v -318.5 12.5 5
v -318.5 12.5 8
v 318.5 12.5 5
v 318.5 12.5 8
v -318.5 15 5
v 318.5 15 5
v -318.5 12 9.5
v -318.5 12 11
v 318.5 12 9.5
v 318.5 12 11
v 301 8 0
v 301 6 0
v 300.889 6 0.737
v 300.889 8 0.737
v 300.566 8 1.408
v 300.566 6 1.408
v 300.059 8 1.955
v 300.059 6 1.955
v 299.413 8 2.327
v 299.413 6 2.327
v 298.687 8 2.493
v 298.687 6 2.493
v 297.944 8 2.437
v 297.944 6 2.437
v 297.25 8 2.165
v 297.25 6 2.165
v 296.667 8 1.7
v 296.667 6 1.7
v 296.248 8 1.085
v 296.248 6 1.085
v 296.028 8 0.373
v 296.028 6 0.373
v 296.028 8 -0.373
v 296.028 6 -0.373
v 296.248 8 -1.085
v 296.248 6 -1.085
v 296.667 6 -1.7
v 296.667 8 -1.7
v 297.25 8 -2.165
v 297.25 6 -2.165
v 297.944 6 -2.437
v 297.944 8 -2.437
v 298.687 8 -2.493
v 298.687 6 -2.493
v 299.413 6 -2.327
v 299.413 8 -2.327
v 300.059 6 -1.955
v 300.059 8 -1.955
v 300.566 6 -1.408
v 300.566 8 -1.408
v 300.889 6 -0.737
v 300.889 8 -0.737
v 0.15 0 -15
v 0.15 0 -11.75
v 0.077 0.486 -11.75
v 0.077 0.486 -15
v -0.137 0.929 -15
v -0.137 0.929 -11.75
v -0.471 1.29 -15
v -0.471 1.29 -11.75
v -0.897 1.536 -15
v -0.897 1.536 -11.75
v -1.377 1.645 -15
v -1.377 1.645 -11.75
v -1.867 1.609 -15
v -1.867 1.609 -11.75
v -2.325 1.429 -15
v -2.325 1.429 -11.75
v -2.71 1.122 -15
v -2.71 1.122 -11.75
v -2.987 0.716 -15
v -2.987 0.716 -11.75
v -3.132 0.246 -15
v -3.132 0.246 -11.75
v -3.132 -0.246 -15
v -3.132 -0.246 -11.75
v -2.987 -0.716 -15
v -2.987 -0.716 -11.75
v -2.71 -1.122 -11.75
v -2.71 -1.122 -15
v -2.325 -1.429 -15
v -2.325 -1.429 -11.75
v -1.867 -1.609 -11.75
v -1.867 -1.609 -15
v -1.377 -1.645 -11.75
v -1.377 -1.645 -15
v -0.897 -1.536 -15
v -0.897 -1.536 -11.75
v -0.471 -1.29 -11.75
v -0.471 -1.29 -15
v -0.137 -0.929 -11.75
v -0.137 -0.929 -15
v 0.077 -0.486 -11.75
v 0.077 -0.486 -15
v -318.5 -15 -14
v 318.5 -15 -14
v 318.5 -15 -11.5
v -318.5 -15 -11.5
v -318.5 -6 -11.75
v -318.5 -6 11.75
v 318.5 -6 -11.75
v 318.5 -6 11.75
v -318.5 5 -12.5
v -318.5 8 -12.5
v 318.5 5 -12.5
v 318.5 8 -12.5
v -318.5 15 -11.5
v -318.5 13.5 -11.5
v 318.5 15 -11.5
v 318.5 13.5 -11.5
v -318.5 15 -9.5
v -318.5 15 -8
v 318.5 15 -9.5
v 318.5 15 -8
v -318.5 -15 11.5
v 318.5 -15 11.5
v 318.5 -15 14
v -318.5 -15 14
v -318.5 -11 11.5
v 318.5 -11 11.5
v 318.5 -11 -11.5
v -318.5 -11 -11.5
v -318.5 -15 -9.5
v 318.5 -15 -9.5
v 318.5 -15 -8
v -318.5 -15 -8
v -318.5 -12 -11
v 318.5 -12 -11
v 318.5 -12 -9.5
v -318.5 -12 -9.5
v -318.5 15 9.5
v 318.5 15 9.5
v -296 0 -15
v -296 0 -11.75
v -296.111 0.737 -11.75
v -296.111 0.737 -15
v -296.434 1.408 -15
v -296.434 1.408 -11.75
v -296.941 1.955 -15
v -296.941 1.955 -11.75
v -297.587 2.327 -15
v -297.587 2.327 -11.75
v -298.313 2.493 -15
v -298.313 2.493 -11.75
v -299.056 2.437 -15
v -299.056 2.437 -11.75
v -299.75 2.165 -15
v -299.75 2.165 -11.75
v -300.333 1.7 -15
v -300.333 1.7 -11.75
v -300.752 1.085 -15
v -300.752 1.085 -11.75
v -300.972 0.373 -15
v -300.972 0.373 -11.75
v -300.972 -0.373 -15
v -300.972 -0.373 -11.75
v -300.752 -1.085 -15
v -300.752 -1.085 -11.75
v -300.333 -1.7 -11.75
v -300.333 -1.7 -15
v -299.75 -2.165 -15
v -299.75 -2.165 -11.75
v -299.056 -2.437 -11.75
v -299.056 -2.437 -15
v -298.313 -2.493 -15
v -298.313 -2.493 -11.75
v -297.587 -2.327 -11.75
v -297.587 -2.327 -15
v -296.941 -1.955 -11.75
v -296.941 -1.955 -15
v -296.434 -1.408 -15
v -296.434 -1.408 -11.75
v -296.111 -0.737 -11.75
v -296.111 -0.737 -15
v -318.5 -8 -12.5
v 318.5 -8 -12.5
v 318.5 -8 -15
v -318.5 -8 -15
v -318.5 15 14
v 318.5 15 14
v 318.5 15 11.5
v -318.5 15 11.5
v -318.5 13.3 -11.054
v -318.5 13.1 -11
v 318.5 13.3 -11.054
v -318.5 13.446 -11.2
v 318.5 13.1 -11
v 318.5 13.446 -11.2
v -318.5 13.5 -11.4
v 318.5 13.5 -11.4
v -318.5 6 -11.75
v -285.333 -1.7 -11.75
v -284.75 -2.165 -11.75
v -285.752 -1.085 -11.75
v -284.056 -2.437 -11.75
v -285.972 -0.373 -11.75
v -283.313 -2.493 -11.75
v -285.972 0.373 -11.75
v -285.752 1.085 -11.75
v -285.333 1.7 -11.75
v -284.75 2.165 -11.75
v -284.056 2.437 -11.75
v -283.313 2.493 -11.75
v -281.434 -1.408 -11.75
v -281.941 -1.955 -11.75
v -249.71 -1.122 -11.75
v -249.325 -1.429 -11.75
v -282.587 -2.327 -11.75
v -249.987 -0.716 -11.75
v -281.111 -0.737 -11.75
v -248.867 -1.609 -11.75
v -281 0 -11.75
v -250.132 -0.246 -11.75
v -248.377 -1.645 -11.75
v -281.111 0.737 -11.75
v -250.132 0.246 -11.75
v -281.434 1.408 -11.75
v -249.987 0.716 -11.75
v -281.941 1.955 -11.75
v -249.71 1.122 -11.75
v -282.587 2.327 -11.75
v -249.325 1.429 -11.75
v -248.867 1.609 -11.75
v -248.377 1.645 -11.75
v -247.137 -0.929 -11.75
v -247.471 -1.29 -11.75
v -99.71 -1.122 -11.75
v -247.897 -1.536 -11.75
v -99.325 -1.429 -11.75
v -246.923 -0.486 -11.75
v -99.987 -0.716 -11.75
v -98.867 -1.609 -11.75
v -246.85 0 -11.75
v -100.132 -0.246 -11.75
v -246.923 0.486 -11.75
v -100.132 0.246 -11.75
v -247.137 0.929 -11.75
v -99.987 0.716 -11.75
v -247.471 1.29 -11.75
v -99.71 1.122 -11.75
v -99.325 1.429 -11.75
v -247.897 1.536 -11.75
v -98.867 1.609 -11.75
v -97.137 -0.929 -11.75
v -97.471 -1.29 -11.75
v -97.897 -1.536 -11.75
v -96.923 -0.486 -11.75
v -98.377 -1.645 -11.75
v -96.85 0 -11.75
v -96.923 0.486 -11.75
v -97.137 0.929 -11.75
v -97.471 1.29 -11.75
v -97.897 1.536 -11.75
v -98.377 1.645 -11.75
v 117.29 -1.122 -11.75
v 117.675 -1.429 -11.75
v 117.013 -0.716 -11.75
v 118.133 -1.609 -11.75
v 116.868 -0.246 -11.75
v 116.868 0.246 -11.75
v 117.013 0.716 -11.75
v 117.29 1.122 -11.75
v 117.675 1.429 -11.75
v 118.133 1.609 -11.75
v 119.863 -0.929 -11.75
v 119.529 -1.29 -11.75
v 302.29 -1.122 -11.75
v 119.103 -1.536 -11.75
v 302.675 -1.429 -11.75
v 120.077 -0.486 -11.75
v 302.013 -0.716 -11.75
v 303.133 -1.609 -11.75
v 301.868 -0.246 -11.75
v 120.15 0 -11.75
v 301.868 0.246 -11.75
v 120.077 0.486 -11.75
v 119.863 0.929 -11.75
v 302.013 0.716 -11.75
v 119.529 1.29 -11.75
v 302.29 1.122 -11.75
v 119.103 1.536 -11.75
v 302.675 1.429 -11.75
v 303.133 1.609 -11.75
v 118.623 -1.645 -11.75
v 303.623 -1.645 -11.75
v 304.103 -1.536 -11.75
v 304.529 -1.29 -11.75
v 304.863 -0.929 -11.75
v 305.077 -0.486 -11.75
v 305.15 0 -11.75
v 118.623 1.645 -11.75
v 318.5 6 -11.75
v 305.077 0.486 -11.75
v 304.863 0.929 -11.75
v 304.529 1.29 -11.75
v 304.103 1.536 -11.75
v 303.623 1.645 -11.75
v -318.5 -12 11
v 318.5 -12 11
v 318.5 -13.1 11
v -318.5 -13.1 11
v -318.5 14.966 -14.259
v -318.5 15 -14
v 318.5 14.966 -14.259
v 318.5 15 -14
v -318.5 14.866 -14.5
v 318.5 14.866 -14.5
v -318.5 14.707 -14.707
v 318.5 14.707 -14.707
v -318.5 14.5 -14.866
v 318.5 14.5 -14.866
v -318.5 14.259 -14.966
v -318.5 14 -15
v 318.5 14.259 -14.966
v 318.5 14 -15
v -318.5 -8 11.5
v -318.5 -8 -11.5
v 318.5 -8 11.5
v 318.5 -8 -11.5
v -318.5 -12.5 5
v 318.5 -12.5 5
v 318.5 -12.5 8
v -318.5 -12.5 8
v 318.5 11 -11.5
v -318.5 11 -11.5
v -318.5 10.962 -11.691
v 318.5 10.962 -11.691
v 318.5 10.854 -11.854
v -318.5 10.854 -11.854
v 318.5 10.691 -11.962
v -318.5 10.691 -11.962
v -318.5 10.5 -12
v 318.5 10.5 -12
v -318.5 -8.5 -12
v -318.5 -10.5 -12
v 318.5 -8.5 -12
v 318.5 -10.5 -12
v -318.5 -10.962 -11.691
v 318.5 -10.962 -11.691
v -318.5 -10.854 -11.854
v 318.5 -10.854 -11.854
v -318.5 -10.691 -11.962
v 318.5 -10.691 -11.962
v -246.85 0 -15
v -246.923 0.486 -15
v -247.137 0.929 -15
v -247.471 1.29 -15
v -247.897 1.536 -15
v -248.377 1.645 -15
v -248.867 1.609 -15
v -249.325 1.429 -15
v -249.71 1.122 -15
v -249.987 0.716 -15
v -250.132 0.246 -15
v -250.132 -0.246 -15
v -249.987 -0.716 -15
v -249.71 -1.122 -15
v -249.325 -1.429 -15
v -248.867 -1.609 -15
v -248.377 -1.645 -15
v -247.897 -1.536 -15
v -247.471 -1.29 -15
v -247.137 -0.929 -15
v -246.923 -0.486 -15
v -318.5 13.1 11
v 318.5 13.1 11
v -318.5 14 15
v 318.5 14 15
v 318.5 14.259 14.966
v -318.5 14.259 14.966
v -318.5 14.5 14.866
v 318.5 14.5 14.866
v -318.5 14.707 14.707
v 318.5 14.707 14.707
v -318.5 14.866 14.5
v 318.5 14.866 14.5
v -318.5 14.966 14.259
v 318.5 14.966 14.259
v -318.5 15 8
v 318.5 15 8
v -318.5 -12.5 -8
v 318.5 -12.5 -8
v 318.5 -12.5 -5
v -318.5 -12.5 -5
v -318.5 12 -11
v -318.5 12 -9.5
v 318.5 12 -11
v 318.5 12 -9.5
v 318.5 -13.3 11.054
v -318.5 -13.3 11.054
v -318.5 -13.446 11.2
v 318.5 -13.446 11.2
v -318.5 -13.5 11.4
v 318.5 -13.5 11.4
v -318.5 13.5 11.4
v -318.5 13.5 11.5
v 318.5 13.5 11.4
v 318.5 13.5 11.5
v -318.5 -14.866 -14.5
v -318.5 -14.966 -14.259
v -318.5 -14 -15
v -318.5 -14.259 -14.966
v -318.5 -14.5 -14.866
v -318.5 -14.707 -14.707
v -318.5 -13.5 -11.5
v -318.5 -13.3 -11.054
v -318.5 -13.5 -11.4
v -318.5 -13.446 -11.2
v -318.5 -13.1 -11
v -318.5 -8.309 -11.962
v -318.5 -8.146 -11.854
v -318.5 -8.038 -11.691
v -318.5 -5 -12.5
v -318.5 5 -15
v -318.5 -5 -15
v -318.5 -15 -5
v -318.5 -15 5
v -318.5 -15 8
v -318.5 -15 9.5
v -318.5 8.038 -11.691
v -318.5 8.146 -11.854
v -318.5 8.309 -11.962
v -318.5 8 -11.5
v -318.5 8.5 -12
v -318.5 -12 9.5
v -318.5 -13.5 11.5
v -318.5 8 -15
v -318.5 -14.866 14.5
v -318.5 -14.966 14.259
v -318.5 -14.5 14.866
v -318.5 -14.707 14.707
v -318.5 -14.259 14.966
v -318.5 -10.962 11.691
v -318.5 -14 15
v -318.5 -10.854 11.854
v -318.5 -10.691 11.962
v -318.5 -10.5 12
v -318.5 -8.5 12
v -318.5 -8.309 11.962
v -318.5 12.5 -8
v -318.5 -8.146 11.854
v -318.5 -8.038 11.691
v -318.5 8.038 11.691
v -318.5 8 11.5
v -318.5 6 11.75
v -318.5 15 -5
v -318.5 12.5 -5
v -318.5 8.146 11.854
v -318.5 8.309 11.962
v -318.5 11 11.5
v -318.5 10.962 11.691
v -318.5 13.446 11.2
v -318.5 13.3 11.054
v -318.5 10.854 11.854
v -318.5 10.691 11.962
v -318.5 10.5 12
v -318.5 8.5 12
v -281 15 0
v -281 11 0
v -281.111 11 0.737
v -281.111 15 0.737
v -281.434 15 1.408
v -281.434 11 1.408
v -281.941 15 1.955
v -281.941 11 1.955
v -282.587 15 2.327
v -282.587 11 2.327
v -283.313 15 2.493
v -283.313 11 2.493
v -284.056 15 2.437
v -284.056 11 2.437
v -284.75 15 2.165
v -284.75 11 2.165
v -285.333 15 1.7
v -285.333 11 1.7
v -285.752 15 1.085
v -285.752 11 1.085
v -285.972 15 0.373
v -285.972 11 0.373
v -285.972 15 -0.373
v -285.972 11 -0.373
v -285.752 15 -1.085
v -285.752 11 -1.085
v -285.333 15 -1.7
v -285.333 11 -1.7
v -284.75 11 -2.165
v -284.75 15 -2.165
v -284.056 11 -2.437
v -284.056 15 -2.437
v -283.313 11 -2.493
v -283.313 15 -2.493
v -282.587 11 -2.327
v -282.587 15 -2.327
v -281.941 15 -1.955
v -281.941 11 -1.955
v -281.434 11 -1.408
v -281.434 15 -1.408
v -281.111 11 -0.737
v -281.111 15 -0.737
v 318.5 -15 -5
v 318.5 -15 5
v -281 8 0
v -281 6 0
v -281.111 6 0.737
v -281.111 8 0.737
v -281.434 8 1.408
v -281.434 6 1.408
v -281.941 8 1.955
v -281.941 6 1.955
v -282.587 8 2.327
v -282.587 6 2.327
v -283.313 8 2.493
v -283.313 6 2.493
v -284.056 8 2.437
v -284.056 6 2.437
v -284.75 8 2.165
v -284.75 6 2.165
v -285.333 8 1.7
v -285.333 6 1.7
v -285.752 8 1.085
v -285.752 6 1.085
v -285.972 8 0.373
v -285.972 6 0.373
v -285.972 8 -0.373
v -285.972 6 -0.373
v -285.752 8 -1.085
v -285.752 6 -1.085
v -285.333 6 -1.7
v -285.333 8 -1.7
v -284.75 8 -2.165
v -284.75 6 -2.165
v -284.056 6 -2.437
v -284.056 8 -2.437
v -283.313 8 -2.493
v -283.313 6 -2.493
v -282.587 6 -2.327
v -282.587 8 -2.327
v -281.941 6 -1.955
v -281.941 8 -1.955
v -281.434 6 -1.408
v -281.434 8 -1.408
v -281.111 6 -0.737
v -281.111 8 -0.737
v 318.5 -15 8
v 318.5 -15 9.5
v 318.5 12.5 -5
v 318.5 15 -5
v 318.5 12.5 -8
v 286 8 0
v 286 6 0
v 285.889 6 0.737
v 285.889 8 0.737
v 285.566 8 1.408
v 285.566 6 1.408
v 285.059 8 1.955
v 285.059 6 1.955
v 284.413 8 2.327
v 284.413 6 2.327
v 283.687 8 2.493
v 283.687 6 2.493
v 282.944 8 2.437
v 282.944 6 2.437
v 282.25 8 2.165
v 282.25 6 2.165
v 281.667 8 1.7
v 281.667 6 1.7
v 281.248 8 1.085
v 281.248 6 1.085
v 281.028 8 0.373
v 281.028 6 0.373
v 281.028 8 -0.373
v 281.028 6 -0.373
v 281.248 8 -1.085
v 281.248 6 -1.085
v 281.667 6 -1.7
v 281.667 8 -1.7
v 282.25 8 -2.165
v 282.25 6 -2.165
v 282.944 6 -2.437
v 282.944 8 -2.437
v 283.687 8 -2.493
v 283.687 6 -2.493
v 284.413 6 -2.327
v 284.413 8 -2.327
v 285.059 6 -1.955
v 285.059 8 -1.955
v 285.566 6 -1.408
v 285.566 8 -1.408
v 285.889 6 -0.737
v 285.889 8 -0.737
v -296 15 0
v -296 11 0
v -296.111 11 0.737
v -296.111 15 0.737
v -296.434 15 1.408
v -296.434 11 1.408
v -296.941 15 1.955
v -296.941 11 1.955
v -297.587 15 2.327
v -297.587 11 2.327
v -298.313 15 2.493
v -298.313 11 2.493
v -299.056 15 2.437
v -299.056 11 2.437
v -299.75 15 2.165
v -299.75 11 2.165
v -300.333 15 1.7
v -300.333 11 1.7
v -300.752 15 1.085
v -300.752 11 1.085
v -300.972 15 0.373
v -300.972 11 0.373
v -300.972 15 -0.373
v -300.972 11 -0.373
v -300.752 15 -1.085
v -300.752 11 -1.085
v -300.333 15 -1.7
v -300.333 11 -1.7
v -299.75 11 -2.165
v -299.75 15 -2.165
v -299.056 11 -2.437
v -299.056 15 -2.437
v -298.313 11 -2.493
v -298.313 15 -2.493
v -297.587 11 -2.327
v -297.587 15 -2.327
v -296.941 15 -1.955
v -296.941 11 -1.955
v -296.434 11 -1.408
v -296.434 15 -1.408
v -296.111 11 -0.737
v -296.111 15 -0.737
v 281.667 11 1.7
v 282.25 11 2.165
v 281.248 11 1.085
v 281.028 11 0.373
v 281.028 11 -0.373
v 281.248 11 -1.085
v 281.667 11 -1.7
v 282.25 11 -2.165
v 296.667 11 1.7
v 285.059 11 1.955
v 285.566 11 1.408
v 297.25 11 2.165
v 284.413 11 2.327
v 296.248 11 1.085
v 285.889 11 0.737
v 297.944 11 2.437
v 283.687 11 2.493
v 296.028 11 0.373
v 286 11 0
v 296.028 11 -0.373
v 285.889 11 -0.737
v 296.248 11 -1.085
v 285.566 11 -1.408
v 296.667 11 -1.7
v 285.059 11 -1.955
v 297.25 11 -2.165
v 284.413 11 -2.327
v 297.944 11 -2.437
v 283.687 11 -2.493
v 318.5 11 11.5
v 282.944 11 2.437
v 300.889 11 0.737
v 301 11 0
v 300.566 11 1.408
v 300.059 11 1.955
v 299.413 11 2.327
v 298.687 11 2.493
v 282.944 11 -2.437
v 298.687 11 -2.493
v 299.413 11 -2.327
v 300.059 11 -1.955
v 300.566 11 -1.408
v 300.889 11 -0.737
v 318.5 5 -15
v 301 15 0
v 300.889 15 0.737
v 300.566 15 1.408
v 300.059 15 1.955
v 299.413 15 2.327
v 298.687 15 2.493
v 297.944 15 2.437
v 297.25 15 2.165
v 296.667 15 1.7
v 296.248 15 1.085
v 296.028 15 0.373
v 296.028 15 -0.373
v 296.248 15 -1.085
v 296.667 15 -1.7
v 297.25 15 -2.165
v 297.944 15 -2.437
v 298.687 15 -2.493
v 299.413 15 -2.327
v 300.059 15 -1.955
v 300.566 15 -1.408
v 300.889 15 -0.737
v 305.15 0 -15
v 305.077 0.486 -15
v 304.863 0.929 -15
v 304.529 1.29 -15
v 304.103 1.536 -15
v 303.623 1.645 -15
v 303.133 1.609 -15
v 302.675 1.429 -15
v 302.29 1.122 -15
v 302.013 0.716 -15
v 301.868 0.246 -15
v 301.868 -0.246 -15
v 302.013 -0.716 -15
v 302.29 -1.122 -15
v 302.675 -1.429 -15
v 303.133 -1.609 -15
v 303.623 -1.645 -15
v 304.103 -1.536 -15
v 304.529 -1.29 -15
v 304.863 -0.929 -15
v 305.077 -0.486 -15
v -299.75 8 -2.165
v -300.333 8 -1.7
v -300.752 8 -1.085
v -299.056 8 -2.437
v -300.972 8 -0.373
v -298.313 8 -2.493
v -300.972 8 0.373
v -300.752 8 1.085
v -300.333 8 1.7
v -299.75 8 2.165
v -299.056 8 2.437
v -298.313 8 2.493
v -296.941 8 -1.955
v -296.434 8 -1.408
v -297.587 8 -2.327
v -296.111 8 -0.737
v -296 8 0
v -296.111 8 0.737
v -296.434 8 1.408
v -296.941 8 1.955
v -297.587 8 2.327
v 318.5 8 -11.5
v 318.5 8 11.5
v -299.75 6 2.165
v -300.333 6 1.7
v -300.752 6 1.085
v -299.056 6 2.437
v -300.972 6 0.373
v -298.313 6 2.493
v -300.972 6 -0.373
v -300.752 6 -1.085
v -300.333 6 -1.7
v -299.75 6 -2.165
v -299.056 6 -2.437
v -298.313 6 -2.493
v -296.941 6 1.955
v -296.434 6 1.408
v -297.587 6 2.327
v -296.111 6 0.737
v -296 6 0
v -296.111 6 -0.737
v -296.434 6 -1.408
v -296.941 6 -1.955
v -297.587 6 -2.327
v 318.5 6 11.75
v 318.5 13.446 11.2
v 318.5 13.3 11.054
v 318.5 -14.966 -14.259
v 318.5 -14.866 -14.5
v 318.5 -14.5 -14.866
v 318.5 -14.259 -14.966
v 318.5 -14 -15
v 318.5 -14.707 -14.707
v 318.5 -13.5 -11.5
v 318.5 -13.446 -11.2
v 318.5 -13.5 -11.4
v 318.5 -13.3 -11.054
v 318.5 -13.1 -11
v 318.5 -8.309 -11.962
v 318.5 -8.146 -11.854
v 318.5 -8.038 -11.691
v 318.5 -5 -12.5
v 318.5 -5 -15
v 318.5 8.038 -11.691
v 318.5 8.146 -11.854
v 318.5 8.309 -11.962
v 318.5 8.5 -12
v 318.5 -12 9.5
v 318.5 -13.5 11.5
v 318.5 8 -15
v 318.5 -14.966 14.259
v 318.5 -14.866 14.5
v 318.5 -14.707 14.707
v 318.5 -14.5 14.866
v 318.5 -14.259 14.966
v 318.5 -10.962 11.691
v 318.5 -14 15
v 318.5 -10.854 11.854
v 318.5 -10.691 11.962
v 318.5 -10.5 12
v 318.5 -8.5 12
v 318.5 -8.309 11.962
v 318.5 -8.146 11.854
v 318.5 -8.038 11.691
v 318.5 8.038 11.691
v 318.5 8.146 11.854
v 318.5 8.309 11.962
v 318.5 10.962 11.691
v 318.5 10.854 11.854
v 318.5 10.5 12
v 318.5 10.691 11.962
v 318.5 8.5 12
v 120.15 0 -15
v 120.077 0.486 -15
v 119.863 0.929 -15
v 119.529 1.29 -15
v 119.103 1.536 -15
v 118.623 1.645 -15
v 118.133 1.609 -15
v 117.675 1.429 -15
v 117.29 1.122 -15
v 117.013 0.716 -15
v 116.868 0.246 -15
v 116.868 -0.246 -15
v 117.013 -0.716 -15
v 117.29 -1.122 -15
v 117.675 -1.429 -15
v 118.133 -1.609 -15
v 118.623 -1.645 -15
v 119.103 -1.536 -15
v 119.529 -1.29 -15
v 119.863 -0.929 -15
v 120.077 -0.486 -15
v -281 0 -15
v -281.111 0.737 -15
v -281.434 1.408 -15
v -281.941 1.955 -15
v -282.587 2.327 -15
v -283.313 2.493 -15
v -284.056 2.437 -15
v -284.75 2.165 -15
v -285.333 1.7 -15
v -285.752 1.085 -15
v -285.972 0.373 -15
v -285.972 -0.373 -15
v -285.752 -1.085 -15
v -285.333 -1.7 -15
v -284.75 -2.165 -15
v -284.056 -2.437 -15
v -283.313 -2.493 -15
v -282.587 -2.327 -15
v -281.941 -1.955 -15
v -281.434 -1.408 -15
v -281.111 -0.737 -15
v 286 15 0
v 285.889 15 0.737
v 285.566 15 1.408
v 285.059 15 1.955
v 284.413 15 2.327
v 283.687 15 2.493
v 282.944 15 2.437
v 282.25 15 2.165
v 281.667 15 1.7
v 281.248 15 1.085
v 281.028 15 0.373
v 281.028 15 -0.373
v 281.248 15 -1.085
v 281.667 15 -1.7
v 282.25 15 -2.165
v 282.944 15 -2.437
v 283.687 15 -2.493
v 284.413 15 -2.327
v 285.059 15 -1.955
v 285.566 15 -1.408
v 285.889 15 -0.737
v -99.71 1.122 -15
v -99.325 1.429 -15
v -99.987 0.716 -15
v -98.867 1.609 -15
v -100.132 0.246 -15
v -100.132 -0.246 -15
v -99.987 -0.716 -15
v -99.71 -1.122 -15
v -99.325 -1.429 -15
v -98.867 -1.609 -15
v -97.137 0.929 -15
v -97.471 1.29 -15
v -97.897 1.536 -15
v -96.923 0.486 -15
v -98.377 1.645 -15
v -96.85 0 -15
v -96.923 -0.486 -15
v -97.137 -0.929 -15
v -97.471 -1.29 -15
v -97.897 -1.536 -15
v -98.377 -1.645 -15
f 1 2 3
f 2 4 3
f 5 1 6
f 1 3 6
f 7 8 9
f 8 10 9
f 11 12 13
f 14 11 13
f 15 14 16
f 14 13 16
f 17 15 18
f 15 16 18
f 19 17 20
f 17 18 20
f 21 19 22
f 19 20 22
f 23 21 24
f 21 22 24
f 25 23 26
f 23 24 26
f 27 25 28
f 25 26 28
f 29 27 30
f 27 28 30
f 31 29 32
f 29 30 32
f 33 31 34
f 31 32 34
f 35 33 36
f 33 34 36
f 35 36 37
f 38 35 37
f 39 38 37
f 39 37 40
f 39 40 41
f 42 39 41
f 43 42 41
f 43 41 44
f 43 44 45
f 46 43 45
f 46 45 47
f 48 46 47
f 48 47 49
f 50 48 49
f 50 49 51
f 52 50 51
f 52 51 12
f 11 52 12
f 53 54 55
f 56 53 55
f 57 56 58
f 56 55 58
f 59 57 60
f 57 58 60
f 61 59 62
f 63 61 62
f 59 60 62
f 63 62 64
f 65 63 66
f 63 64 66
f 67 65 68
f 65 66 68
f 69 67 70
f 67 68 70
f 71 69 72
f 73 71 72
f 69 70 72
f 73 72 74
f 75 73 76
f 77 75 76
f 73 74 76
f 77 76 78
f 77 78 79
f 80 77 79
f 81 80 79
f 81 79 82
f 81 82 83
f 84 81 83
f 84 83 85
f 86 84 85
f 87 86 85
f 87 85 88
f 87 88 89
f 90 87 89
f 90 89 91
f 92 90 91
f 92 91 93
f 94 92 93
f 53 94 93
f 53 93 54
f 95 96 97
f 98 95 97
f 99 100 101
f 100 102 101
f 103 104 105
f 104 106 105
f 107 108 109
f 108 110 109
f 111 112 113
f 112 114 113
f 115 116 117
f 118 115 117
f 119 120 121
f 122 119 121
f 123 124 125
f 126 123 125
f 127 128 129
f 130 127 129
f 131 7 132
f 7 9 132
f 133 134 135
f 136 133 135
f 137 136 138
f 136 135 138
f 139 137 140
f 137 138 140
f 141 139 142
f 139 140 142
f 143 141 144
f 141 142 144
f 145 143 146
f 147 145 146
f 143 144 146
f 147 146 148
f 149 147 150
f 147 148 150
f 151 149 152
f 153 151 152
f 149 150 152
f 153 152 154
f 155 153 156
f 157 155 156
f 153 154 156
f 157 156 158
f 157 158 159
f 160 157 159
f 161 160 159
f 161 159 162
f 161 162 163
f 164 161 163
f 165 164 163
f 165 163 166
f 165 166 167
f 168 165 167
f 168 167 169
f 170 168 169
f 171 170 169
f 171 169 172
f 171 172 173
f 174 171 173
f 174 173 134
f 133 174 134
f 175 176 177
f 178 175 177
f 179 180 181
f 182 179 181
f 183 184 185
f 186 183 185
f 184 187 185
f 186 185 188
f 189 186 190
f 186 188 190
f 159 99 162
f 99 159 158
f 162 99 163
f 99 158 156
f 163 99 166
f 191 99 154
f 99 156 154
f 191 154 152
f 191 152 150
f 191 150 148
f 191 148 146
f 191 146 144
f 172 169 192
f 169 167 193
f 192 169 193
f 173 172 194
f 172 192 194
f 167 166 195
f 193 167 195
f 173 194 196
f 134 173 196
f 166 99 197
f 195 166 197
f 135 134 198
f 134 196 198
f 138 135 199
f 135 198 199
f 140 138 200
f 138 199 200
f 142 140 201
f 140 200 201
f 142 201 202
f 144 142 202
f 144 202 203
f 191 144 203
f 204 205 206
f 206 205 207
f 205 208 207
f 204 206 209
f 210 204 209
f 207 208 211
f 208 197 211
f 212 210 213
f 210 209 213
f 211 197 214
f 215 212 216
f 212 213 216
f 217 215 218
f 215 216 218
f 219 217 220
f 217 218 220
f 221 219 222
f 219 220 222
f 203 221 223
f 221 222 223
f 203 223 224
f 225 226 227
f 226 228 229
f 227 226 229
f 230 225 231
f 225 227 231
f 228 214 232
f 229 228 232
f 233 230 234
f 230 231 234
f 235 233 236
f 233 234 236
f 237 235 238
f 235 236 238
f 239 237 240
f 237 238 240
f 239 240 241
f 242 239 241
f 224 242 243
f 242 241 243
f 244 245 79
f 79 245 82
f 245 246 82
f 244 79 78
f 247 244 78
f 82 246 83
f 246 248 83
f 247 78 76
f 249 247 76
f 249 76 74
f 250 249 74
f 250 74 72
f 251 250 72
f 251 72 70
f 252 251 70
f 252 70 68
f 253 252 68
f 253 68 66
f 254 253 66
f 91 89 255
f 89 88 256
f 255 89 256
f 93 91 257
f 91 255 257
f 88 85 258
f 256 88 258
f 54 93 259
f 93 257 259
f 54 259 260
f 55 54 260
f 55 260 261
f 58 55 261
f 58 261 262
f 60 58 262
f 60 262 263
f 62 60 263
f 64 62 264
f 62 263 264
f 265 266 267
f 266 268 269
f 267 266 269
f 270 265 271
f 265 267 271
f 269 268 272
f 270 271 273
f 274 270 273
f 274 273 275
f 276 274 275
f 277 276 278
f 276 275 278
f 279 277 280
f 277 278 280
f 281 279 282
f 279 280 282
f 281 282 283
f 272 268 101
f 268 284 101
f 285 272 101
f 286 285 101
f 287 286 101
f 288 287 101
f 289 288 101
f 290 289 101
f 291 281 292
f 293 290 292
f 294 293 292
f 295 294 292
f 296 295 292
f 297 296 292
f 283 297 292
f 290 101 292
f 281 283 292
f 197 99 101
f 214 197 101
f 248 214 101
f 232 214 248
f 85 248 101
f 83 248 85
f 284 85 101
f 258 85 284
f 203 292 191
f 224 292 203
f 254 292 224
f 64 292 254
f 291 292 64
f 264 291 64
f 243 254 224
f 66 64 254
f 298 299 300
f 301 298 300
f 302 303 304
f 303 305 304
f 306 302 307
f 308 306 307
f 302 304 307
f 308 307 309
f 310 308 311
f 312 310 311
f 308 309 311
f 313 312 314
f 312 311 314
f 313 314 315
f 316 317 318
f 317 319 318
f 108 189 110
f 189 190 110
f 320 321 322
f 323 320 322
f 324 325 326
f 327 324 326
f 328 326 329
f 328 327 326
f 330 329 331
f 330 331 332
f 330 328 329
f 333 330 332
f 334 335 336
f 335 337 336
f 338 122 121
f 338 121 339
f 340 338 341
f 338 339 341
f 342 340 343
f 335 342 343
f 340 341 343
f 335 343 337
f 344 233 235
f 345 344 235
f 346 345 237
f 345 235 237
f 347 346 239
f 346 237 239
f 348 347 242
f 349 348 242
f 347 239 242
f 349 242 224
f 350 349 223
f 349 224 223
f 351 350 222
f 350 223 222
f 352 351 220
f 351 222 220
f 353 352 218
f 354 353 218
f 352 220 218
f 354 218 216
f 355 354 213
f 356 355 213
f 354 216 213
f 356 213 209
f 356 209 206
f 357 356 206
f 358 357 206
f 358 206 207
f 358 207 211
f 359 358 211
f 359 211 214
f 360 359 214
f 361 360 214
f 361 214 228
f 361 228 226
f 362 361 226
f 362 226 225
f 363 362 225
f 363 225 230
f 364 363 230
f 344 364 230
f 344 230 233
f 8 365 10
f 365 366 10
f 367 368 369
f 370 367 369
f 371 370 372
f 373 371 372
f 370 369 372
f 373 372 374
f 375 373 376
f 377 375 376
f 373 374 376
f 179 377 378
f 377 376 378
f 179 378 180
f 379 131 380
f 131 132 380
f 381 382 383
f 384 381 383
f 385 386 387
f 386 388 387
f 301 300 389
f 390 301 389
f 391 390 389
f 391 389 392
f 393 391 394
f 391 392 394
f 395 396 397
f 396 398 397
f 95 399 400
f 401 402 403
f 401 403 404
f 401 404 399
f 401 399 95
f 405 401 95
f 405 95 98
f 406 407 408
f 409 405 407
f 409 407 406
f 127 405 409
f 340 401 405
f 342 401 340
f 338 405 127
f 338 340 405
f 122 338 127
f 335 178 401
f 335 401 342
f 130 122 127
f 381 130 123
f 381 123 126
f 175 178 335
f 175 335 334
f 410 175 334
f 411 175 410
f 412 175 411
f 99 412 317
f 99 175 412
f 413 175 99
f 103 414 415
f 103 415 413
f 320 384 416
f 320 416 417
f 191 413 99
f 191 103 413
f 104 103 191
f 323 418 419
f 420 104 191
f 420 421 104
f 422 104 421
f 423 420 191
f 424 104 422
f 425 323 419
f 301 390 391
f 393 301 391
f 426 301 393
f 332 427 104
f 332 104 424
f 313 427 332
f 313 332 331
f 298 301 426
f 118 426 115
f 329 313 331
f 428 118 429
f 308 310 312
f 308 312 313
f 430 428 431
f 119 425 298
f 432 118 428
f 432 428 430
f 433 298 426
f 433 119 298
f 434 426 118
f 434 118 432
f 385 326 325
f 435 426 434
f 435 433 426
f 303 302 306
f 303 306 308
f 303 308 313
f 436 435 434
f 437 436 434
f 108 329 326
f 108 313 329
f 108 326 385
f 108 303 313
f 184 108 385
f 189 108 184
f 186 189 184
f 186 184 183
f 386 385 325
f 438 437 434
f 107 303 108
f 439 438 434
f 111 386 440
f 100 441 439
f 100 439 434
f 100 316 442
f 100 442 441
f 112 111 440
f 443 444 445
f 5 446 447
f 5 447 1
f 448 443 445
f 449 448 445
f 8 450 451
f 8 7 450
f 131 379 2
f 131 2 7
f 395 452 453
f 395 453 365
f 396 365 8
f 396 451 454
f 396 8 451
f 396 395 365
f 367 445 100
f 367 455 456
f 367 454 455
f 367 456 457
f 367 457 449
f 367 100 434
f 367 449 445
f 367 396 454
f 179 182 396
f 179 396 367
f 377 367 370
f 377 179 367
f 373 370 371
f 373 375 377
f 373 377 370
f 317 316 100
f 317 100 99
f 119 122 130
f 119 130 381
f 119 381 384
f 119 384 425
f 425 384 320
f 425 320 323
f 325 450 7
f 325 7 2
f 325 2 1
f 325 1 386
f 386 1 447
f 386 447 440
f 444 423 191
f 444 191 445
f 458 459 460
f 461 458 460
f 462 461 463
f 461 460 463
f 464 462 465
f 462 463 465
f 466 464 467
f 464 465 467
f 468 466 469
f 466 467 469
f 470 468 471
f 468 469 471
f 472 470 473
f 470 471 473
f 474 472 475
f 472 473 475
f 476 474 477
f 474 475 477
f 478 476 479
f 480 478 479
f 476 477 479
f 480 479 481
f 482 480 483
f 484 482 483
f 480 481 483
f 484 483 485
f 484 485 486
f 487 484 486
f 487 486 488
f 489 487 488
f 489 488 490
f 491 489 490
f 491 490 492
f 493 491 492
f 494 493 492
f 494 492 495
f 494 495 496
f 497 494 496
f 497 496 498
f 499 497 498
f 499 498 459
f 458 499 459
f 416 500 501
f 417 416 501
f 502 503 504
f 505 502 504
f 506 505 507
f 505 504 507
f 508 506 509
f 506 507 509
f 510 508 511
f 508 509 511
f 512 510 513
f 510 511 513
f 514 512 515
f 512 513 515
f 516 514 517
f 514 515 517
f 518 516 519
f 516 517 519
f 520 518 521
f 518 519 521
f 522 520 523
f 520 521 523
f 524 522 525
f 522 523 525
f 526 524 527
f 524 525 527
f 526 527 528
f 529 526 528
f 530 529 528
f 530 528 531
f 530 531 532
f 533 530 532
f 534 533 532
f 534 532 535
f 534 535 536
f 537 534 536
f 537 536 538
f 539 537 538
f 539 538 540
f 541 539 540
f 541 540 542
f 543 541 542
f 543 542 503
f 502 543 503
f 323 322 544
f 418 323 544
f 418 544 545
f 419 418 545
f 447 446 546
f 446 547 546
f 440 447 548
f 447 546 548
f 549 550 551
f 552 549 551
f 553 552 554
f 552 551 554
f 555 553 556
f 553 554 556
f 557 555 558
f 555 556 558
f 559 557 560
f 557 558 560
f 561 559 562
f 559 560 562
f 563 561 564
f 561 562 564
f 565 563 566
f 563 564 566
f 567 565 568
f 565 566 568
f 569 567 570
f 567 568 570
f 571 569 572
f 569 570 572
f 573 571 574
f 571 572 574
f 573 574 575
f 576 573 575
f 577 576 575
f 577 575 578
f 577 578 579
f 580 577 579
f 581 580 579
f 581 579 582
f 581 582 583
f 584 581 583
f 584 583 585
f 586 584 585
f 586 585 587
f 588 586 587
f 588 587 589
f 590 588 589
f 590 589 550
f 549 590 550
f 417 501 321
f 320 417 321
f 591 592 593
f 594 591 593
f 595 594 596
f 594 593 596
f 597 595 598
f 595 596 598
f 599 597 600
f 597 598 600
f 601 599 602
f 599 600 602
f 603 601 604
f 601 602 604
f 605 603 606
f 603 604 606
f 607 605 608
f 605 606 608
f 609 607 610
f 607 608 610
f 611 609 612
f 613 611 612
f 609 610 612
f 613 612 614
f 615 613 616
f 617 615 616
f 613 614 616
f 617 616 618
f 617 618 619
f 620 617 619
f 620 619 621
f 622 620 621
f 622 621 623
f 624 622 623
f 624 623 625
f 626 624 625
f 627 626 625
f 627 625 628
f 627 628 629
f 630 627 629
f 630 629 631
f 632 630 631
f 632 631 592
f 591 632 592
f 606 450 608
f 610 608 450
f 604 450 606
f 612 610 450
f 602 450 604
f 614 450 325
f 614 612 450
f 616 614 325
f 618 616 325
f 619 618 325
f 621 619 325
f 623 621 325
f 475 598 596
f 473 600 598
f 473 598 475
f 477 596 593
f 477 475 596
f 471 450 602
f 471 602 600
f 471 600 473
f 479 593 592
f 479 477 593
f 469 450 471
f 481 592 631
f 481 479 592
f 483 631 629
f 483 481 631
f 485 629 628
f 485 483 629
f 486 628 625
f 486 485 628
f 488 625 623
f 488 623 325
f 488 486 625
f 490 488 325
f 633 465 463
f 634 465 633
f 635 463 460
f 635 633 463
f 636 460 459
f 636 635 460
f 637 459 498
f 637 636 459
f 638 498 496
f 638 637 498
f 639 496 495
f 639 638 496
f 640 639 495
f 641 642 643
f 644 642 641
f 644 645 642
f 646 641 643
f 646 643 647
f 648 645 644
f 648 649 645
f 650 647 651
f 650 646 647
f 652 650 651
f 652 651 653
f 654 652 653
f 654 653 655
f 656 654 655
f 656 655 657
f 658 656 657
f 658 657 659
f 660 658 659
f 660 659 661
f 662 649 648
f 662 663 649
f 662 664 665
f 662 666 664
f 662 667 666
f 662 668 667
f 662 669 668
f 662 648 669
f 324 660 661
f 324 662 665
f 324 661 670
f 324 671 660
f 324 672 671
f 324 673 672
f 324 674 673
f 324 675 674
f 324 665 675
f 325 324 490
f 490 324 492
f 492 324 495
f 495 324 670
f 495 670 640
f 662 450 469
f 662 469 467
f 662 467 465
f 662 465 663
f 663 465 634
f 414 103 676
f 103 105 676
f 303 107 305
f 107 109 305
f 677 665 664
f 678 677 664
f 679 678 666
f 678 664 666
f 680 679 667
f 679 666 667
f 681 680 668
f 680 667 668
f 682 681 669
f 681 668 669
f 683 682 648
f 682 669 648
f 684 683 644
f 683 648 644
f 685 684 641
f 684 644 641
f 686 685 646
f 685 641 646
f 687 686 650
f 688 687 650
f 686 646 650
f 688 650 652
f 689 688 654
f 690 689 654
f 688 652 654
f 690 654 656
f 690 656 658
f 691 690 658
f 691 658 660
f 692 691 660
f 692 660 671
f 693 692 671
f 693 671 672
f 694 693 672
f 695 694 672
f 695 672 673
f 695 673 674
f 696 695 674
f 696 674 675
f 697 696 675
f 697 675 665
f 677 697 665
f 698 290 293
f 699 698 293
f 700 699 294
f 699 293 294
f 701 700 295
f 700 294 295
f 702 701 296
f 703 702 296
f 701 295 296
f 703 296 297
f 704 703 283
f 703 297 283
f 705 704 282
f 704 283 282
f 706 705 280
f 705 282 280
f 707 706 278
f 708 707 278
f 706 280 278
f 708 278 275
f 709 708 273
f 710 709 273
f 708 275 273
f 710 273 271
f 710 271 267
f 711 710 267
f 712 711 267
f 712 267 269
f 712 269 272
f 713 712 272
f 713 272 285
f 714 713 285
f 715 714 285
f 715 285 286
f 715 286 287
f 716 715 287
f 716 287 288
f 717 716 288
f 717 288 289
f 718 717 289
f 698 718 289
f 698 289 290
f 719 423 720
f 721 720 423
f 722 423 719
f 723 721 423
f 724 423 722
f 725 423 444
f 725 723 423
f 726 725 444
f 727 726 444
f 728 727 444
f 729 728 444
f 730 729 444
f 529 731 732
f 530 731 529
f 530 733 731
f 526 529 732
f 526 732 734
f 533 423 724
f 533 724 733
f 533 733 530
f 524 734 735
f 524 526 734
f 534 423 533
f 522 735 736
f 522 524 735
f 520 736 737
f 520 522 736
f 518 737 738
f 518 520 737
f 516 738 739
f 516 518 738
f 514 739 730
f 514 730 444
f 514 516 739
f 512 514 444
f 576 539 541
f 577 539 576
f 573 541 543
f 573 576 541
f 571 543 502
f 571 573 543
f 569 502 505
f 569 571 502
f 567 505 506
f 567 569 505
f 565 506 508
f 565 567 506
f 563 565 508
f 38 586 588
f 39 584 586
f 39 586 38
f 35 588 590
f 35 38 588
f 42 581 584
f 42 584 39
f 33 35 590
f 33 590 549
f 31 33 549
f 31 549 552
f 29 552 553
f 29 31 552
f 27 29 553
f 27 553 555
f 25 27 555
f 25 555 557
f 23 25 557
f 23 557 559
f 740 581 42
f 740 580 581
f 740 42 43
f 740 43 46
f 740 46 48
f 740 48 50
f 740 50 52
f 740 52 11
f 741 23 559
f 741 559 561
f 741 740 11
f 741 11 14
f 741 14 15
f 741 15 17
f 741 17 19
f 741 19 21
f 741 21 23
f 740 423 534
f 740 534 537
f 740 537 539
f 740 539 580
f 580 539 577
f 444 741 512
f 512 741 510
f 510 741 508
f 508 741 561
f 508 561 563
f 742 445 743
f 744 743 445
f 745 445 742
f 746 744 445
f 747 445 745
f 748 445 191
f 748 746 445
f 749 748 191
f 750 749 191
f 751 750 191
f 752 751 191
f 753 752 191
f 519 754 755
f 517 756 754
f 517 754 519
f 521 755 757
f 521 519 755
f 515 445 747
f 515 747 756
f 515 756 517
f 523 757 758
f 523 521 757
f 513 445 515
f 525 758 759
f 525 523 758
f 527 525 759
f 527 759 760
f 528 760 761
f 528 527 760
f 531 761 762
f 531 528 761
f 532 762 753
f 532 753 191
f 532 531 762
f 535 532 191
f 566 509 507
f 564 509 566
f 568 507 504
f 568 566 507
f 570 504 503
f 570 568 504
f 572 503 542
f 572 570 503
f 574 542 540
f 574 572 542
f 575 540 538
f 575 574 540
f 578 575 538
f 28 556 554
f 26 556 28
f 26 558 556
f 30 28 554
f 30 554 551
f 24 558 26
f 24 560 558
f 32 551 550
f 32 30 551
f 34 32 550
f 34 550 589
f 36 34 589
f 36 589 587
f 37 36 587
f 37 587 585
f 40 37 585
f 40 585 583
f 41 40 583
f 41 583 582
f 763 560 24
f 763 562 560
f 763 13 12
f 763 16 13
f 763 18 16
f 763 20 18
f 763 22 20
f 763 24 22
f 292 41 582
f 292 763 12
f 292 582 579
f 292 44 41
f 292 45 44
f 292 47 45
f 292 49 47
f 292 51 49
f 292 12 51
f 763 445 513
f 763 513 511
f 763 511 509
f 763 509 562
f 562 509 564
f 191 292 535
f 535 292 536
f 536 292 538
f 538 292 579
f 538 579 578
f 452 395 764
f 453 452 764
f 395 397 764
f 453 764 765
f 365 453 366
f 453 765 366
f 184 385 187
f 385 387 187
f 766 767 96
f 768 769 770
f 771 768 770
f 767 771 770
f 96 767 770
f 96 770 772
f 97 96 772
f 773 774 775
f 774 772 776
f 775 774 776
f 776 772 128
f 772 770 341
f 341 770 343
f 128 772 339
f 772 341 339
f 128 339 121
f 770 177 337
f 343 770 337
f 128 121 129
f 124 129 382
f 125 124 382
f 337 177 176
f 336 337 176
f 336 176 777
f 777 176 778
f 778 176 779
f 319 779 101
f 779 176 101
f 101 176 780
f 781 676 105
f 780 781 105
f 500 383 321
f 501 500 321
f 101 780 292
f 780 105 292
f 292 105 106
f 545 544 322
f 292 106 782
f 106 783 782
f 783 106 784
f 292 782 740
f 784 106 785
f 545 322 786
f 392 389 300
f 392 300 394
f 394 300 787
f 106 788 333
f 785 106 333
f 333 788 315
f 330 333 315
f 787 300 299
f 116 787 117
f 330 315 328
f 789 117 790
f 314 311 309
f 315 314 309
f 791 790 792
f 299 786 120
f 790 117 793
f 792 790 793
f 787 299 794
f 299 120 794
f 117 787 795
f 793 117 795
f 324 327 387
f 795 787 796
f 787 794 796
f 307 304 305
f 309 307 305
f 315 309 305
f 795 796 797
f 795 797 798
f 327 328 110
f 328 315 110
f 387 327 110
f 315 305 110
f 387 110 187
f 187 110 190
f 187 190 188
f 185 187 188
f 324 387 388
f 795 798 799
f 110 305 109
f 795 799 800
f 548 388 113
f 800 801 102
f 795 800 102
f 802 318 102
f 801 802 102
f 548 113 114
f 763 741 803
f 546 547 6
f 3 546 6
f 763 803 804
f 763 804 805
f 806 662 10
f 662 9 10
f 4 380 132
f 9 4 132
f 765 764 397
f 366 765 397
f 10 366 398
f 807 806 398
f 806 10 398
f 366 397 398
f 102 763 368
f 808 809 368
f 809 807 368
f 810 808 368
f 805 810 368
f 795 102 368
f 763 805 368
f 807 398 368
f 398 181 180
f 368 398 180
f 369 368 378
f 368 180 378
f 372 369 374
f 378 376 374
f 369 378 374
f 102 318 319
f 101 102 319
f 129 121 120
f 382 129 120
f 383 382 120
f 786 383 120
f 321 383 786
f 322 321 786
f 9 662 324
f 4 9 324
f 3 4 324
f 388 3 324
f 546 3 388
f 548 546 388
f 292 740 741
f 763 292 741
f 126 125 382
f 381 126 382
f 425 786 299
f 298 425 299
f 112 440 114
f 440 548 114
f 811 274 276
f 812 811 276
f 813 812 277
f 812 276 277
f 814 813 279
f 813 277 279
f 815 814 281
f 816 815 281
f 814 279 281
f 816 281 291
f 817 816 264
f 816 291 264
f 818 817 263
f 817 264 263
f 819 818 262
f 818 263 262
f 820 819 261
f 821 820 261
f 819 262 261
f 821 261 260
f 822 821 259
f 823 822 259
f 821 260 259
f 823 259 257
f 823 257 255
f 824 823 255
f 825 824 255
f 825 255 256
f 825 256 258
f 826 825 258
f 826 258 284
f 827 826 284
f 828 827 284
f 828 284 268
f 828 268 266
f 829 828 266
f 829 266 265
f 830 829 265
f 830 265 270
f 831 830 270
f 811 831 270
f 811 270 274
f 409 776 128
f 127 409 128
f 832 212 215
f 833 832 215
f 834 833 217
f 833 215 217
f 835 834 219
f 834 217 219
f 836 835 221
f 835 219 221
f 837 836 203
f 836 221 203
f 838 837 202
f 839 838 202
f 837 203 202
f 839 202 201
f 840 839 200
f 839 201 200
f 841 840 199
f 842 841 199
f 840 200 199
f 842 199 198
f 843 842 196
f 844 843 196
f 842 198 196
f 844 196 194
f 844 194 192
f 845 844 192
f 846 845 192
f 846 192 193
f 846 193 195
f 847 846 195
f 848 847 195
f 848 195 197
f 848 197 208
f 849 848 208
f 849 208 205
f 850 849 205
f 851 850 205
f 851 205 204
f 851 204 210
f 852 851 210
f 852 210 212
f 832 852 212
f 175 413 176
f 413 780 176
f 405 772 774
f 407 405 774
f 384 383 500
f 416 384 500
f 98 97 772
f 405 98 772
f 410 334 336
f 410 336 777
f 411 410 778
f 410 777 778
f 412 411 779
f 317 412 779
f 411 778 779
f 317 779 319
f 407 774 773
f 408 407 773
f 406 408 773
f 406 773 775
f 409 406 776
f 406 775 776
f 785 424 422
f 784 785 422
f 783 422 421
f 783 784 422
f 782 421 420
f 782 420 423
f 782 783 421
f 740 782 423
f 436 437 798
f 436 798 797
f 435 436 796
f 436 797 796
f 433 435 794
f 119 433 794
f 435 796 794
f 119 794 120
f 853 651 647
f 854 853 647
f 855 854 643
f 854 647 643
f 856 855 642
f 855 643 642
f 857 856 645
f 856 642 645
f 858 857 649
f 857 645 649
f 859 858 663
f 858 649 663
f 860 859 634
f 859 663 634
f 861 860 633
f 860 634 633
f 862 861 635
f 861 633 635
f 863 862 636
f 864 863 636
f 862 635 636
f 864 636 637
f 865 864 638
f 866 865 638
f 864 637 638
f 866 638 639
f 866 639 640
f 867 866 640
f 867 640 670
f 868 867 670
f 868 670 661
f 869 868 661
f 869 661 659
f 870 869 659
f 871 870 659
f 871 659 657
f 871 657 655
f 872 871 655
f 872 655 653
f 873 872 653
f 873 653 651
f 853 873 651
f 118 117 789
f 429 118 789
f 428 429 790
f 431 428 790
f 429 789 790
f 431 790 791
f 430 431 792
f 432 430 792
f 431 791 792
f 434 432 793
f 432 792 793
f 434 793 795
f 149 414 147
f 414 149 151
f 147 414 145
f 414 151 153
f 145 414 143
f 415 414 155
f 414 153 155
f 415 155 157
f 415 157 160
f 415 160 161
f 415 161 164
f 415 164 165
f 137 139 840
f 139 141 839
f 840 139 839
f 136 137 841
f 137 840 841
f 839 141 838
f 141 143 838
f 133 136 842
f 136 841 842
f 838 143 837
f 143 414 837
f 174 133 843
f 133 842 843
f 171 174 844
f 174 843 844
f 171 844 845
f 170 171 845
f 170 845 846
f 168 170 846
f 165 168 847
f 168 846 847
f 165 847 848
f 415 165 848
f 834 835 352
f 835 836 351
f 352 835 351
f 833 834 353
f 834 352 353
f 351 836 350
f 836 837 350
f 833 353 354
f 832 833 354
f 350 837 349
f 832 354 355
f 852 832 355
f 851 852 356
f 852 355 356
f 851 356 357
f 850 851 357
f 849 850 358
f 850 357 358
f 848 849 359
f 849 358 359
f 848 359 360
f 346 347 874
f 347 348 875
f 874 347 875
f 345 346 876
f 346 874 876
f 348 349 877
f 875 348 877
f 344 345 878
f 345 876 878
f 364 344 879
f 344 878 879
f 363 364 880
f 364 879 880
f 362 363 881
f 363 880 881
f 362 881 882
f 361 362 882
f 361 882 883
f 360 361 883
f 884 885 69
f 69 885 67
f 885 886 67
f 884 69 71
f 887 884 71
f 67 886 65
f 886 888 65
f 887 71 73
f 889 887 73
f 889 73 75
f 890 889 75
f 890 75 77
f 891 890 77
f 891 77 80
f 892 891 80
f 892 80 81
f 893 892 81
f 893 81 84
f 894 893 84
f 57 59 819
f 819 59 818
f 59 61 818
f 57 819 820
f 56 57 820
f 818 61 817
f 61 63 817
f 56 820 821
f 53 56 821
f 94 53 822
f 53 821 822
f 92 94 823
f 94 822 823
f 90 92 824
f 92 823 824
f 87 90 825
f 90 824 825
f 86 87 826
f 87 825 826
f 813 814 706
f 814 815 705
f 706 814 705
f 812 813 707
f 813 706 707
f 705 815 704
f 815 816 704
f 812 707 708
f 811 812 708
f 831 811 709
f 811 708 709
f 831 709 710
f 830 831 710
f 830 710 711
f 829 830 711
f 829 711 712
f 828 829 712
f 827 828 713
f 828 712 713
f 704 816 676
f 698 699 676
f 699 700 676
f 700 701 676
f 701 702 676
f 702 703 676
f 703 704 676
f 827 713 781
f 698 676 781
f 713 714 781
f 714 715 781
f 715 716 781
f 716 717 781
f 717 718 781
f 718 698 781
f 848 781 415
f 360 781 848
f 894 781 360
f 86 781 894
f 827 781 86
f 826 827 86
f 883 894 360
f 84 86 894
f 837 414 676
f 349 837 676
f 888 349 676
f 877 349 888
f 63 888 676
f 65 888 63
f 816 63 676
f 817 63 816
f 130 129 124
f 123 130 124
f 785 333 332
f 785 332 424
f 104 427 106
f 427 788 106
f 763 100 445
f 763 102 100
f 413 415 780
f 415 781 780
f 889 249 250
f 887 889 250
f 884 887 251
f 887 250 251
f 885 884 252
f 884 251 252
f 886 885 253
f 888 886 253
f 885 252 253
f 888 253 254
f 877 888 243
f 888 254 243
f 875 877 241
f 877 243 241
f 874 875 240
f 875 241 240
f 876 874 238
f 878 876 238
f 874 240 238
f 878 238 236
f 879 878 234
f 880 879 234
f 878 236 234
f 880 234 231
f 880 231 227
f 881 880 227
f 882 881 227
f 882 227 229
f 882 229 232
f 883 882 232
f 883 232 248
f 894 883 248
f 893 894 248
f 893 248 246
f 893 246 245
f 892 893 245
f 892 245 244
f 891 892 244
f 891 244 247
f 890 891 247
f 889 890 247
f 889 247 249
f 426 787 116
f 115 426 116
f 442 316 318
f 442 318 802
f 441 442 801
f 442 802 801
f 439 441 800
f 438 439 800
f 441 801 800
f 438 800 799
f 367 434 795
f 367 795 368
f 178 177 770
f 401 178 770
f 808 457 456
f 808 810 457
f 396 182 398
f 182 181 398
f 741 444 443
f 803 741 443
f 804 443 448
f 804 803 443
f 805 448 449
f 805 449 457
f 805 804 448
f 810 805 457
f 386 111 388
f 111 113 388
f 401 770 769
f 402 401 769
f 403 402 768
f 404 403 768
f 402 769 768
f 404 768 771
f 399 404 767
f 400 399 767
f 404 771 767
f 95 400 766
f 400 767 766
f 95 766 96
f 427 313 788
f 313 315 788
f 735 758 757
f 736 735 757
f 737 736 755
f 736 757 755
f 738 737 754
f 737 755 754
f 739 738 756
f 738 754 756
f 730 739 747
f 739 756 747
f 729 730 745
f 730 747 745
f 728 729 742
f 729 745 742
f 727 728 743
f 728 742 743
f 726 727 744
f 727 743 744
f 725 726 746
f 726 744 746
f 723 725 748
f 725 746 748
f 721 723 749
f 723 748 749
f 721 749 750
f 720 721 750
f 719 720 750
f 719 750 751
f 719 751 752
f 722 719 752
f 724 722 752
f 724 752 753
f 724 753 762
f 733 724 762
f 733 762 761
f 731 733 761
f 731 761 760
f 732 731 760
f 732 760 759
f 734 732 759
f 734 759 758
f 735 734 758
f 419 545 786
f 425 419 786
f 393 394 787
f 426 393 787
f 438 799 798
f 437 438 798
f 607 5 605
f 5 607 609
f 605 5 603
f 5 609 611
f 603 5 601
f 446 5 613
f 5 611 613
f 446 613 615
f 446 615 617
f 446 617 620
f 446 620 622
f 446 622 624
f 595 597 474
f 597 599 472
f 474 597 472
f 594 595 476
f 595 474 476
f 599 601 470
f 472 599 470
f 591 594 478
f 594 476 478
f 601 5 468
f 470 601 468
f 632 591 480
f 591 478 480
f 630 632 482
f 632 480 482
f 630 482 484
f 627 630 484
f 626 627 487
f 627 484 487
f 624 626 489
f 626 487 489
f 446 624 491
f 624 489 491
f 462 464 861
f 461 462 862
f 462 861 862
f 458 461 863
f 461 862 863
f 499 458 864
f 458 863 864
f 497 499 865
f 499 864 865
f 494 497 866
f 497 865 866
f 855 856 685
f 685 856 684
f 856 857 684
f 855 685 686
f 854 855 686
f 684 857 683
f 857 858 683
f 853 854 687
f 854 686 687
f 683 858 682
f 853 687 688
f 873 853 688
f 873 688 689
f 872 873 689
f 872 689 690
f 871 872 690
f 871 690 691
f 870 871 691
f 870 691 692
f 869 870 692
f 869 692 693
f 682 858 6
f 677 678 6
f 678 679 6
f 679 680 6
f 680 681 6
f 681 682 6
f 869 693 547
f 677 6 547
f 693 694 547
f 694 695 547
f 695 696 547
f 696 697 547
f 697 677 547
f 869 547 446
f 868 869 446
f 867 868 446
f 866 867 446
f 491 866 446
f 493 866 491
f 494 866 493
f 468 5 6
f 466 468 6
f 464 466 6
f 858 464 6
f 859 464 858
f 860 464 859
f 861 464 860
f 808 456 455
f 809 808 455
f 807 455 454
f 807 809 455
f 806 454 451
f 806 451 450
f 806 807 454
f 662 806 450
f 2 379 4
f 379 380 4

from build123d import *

# Parameters (mm, degrees)
SKETCH_1_W             = 23.5
SKETCH_1_H             = 12
EXTRUDE_1_DEPTH        = 318.5
HOLE_WIZARD_M6_1_D     = 5
HOLE_WIZARD_M6_1_DEPTH = 15
HOLE_WIZARD_M6_1_TIP   = 1.502151548
HOLE_WIZARD_M6_2_D     = 5
HOLE_WIZARD_M6_2_DEPTH = 15
HOLE_WIZARD_M6_2_TIP   = 1.502151548
HOLE_WIZARD_M4_1_D     = 3.3
HOLE_WIZARD_M4_1_DEPTH = 10.1
HOLE_WIZARD_M4_1_TIP   = 0.991420021


with BuildPart() as part:
    # 草图1 → 凸台-拉伸1 (new, symmetric)
    with BuildSketch(Plane(origin=(0, 0, 0), x_dir=(0, 0, -1), z_dir=(1, 0, 0))):
        with BuildLine():
            Line((-14, 15), (-11.5, 15))
            Line((-11.5, 15), (-11.5, 13.5))
            Line((-11.5, 13.5), (-11.4, 13.5))
            ThreePointArc((-11.4, 13.5), (-11.117157288, 13.382842712), (-11, 13.1))
            Line((-11, 13.1), (-11, 12))
            Line((-11, 12), (-9.5, 12))
            Line((-9.5, 12), (-9.5, 15))
            Line((-9.5, 15), (-8, 15))
            Line((-8, 15), (-8, 12.5))
            Line((-8, 12.5), (-5, 12.5))
            Line((-5, 12.5), (-5, 15))
            Line((-5, 15), (5, 15))
            Line((5, 15), (5, 12.5))
            Line((5, 12.5), (8, 12.5))
            Line((8, 12.5), (8, 15))
            Line((8, 15), (9.5, 15))
            Line((9.5, 15), (9.5, 12))
            Line((9.5, 12), (11, 12))
            Line((11, 12), (11, 13.1))
            ThreePointArc((11, 13.1), (11.117157288, 13.382842712), (11.4, 13.5))
            Line((11.4, 13.5), (11.5, 13.5))
            Line((11.5, 13.5), (11.5, 15))
            Line((11.5, 15), (14, 15))
            ThreePointArc((14, 15), (14.707106781, 14.707106781), (15, 14))
            Line((15, 14), (15, 8))
            Line((15, 8), (12.5, 8))
            Line((12.5, 8), (12.5, 5))
            Line((12.5, 5), (15, 5))
            Line((15, 5), (15, -5))
            Line((15, -5), (12.5, -5))
            Line((12.5, -5), (12.5, -8))
            Line((12.5, -8), (15, -8))
            Line((15, -8), (15, -14))
            ThreePointArc((15, -14), (14.707106781, -14.707106781), (14, -15))
            Line((14, -15), (11.5, -15))
            Line((11.5, -15), (11.5, -13.5))
            Line((11.5, -13.5), (11.4, -13.5))
            ThreePointArc((11.4, -13.5), (11.117157288, -13.382842712), (11, -13.1))
            Line((11, -13.1), (11, -12))
            Line((11, -12), (9.5, -12))
            Line((9.5, -12), (9.5, -15))
            Line((9.5, -15), (8, -15))
            Line((8, -15), (8, -12.5))
            Line((8, -12.5), (5, -12.5))
            Line((5, -12.5), (5, -15))
            Line((5, -15), (-5, -15))
            Line((-5, -15), (-5, -12.5))
            Line((-5, -12.5), (-8, -12.5))
            Line((-8, -12.5), (-8, -15))
            Line((-8, -15), (-9.5, -15))
            Line((-9.5, -15), (-9.5, -12))
            Line((-9.5, -12), (-11, -12))
            Line((-11, -12), (-11, -13.1))
            ThreePointArc((-11, -13.1), (-11.117157288, -13.382842712), (-11.4, -13.5))
            Line((-11.4, -13.5), (-11.5, -13.5))
            Line((-11.5, -13.5), (-11.5, -15))
            Line((-11.5, -15), (-14, -15))
            ThreePointArc((-14, -15), (-14.707106781, -14.707106781), (-15, -14))
            Line((-15, -14), (-15, 14))
            ThreePointArc((-15, 14), (-14.707106781, 14.707106781), (-14, 15))
        make_face()
        with BuildLine():
            Line((12, -10.5), (12, -8.5))
            ThreePointArc((12, -8.5), (11.853553391, -8.146446609), (11.5, -8))
            Line((11.5, -8), (-11.5, -8))
            ThreePointArc((-11.5, -8), (-11.853553391, -8.146446609), (-12, -8.5))
            Line((-12, -8.5), (-12, -10.5))
            ThreePointArc((-12, -10.5), (-11.853553391, -10.853553391), (-11.5, -11))
            Line((-11.5, -11), (11.5, -11))
            ThreePointArc((11.5, -11), (11.853553391, -10.853553391), (12, -10.5))
        make_face(mode=Mode.SUBTRACT)
        with BuildLine():
            Line((-11.5, 11), (11.5, 11))
            ThreePointArc((11.5, 11), (11.853553391, 10.853553391), (12, 10.5))
            Line((12, 10.5), (12, 8.5))
            ThreePointArc((12, 8.5), (11.853553391, 8.146446609), (11.5, 8))
            Line((11.5, 8), (-11.5, 8))
            ThreePointArc((-11.5, 8), (-11.853553391, 8.146446609), (-12, 8.5))
            Line((-12, 8.5), (-12, 10.5))
            ThreePointArc((-12, 10.5), (-11.853553391, 10.853553391), (-11.5, 11))
        make_face(mode=Mode.SUBTRACT)
        Rectangle(SKETCH_1_W, SKETCH_1_H, mode=Mode.SUBTRACT)
    extrude(amount=EXTRUDE_1_DEPTH, both=True)

    # M6 螺纹孔1
    with Locations(Plane(origin=(0, 15, 0), x_dir=(-1, 0, 0), z_dir=(0, 1, 0))):
        with Locations((298.5, 0), (283.5, 0), (-283.5, 0), (-298.5, 0)):
            Hole(HOLE_WIZARD_M6_1_D / 2, depth=HOLE_WIZARD_M6_1_DEPTH)
            with Locations((0, 0, -(HOLE_WIZARD_M6_1_DEPTH + HOLE_WIZARD_M6_1_TIP / 2))):  # 118° drill point
                Cone(0, HOLE_WIZARD_M6_1_D / 2, HOLE_WIZARD_M6_1_TIP, mode=Mode.SUBTRACT)

    # M6 螺纹孔2
    with Locations(Plane(origin=(0, 0, -15), x_dir=(-1, 0, 0), z_dir=(0, 0, -1))):
        with Locations((298.5, 0), (283.5, 0)):
            Hole(HOLE_WIZARD_M6_2_D / 2, depth=HOLE_WIZARD_M6_2_DEPTH)
            with Locations((0, 0, -(HOLE_WIZARD_M6_2_DEPTH + HOLE_WIZARD_M6_2_TIP / 2))):  # 118° drill point
                Cone(0, HOLE_WIZARD_M6_2_D / 2, HOLE_WIZARD_M6_2_TIP, mode=Mode.SUBTRACT)

    # M4 螺纹孔1
    with Locations(Plane(origin=(0, 0, -15), x_dir=(-1, 0, 0), z_dir=(0, 0, -1))):
        with Locations((-303.5, 0), (-118.5, 0), (1.5, 0), (98.5, 0), (248.5, 0)):
            Hole(HOLE_WIZARD_M4_1_D / 2, depth=HOLE_WIZARD_M4_1_DEPTH)
            with Locations((0, 0, -(HOLE_WIZARD_M4_1_DEPTH + HOLE_WIZARD_M4_1_TIP / 2))):  # 118° drill point
                Cone(0, HOLE_WIZARD_M4_1_D / 2, HOLE_WIZARD_M4_1_TIP, mode=Mode.SUBTRACT)


solid = part.part
